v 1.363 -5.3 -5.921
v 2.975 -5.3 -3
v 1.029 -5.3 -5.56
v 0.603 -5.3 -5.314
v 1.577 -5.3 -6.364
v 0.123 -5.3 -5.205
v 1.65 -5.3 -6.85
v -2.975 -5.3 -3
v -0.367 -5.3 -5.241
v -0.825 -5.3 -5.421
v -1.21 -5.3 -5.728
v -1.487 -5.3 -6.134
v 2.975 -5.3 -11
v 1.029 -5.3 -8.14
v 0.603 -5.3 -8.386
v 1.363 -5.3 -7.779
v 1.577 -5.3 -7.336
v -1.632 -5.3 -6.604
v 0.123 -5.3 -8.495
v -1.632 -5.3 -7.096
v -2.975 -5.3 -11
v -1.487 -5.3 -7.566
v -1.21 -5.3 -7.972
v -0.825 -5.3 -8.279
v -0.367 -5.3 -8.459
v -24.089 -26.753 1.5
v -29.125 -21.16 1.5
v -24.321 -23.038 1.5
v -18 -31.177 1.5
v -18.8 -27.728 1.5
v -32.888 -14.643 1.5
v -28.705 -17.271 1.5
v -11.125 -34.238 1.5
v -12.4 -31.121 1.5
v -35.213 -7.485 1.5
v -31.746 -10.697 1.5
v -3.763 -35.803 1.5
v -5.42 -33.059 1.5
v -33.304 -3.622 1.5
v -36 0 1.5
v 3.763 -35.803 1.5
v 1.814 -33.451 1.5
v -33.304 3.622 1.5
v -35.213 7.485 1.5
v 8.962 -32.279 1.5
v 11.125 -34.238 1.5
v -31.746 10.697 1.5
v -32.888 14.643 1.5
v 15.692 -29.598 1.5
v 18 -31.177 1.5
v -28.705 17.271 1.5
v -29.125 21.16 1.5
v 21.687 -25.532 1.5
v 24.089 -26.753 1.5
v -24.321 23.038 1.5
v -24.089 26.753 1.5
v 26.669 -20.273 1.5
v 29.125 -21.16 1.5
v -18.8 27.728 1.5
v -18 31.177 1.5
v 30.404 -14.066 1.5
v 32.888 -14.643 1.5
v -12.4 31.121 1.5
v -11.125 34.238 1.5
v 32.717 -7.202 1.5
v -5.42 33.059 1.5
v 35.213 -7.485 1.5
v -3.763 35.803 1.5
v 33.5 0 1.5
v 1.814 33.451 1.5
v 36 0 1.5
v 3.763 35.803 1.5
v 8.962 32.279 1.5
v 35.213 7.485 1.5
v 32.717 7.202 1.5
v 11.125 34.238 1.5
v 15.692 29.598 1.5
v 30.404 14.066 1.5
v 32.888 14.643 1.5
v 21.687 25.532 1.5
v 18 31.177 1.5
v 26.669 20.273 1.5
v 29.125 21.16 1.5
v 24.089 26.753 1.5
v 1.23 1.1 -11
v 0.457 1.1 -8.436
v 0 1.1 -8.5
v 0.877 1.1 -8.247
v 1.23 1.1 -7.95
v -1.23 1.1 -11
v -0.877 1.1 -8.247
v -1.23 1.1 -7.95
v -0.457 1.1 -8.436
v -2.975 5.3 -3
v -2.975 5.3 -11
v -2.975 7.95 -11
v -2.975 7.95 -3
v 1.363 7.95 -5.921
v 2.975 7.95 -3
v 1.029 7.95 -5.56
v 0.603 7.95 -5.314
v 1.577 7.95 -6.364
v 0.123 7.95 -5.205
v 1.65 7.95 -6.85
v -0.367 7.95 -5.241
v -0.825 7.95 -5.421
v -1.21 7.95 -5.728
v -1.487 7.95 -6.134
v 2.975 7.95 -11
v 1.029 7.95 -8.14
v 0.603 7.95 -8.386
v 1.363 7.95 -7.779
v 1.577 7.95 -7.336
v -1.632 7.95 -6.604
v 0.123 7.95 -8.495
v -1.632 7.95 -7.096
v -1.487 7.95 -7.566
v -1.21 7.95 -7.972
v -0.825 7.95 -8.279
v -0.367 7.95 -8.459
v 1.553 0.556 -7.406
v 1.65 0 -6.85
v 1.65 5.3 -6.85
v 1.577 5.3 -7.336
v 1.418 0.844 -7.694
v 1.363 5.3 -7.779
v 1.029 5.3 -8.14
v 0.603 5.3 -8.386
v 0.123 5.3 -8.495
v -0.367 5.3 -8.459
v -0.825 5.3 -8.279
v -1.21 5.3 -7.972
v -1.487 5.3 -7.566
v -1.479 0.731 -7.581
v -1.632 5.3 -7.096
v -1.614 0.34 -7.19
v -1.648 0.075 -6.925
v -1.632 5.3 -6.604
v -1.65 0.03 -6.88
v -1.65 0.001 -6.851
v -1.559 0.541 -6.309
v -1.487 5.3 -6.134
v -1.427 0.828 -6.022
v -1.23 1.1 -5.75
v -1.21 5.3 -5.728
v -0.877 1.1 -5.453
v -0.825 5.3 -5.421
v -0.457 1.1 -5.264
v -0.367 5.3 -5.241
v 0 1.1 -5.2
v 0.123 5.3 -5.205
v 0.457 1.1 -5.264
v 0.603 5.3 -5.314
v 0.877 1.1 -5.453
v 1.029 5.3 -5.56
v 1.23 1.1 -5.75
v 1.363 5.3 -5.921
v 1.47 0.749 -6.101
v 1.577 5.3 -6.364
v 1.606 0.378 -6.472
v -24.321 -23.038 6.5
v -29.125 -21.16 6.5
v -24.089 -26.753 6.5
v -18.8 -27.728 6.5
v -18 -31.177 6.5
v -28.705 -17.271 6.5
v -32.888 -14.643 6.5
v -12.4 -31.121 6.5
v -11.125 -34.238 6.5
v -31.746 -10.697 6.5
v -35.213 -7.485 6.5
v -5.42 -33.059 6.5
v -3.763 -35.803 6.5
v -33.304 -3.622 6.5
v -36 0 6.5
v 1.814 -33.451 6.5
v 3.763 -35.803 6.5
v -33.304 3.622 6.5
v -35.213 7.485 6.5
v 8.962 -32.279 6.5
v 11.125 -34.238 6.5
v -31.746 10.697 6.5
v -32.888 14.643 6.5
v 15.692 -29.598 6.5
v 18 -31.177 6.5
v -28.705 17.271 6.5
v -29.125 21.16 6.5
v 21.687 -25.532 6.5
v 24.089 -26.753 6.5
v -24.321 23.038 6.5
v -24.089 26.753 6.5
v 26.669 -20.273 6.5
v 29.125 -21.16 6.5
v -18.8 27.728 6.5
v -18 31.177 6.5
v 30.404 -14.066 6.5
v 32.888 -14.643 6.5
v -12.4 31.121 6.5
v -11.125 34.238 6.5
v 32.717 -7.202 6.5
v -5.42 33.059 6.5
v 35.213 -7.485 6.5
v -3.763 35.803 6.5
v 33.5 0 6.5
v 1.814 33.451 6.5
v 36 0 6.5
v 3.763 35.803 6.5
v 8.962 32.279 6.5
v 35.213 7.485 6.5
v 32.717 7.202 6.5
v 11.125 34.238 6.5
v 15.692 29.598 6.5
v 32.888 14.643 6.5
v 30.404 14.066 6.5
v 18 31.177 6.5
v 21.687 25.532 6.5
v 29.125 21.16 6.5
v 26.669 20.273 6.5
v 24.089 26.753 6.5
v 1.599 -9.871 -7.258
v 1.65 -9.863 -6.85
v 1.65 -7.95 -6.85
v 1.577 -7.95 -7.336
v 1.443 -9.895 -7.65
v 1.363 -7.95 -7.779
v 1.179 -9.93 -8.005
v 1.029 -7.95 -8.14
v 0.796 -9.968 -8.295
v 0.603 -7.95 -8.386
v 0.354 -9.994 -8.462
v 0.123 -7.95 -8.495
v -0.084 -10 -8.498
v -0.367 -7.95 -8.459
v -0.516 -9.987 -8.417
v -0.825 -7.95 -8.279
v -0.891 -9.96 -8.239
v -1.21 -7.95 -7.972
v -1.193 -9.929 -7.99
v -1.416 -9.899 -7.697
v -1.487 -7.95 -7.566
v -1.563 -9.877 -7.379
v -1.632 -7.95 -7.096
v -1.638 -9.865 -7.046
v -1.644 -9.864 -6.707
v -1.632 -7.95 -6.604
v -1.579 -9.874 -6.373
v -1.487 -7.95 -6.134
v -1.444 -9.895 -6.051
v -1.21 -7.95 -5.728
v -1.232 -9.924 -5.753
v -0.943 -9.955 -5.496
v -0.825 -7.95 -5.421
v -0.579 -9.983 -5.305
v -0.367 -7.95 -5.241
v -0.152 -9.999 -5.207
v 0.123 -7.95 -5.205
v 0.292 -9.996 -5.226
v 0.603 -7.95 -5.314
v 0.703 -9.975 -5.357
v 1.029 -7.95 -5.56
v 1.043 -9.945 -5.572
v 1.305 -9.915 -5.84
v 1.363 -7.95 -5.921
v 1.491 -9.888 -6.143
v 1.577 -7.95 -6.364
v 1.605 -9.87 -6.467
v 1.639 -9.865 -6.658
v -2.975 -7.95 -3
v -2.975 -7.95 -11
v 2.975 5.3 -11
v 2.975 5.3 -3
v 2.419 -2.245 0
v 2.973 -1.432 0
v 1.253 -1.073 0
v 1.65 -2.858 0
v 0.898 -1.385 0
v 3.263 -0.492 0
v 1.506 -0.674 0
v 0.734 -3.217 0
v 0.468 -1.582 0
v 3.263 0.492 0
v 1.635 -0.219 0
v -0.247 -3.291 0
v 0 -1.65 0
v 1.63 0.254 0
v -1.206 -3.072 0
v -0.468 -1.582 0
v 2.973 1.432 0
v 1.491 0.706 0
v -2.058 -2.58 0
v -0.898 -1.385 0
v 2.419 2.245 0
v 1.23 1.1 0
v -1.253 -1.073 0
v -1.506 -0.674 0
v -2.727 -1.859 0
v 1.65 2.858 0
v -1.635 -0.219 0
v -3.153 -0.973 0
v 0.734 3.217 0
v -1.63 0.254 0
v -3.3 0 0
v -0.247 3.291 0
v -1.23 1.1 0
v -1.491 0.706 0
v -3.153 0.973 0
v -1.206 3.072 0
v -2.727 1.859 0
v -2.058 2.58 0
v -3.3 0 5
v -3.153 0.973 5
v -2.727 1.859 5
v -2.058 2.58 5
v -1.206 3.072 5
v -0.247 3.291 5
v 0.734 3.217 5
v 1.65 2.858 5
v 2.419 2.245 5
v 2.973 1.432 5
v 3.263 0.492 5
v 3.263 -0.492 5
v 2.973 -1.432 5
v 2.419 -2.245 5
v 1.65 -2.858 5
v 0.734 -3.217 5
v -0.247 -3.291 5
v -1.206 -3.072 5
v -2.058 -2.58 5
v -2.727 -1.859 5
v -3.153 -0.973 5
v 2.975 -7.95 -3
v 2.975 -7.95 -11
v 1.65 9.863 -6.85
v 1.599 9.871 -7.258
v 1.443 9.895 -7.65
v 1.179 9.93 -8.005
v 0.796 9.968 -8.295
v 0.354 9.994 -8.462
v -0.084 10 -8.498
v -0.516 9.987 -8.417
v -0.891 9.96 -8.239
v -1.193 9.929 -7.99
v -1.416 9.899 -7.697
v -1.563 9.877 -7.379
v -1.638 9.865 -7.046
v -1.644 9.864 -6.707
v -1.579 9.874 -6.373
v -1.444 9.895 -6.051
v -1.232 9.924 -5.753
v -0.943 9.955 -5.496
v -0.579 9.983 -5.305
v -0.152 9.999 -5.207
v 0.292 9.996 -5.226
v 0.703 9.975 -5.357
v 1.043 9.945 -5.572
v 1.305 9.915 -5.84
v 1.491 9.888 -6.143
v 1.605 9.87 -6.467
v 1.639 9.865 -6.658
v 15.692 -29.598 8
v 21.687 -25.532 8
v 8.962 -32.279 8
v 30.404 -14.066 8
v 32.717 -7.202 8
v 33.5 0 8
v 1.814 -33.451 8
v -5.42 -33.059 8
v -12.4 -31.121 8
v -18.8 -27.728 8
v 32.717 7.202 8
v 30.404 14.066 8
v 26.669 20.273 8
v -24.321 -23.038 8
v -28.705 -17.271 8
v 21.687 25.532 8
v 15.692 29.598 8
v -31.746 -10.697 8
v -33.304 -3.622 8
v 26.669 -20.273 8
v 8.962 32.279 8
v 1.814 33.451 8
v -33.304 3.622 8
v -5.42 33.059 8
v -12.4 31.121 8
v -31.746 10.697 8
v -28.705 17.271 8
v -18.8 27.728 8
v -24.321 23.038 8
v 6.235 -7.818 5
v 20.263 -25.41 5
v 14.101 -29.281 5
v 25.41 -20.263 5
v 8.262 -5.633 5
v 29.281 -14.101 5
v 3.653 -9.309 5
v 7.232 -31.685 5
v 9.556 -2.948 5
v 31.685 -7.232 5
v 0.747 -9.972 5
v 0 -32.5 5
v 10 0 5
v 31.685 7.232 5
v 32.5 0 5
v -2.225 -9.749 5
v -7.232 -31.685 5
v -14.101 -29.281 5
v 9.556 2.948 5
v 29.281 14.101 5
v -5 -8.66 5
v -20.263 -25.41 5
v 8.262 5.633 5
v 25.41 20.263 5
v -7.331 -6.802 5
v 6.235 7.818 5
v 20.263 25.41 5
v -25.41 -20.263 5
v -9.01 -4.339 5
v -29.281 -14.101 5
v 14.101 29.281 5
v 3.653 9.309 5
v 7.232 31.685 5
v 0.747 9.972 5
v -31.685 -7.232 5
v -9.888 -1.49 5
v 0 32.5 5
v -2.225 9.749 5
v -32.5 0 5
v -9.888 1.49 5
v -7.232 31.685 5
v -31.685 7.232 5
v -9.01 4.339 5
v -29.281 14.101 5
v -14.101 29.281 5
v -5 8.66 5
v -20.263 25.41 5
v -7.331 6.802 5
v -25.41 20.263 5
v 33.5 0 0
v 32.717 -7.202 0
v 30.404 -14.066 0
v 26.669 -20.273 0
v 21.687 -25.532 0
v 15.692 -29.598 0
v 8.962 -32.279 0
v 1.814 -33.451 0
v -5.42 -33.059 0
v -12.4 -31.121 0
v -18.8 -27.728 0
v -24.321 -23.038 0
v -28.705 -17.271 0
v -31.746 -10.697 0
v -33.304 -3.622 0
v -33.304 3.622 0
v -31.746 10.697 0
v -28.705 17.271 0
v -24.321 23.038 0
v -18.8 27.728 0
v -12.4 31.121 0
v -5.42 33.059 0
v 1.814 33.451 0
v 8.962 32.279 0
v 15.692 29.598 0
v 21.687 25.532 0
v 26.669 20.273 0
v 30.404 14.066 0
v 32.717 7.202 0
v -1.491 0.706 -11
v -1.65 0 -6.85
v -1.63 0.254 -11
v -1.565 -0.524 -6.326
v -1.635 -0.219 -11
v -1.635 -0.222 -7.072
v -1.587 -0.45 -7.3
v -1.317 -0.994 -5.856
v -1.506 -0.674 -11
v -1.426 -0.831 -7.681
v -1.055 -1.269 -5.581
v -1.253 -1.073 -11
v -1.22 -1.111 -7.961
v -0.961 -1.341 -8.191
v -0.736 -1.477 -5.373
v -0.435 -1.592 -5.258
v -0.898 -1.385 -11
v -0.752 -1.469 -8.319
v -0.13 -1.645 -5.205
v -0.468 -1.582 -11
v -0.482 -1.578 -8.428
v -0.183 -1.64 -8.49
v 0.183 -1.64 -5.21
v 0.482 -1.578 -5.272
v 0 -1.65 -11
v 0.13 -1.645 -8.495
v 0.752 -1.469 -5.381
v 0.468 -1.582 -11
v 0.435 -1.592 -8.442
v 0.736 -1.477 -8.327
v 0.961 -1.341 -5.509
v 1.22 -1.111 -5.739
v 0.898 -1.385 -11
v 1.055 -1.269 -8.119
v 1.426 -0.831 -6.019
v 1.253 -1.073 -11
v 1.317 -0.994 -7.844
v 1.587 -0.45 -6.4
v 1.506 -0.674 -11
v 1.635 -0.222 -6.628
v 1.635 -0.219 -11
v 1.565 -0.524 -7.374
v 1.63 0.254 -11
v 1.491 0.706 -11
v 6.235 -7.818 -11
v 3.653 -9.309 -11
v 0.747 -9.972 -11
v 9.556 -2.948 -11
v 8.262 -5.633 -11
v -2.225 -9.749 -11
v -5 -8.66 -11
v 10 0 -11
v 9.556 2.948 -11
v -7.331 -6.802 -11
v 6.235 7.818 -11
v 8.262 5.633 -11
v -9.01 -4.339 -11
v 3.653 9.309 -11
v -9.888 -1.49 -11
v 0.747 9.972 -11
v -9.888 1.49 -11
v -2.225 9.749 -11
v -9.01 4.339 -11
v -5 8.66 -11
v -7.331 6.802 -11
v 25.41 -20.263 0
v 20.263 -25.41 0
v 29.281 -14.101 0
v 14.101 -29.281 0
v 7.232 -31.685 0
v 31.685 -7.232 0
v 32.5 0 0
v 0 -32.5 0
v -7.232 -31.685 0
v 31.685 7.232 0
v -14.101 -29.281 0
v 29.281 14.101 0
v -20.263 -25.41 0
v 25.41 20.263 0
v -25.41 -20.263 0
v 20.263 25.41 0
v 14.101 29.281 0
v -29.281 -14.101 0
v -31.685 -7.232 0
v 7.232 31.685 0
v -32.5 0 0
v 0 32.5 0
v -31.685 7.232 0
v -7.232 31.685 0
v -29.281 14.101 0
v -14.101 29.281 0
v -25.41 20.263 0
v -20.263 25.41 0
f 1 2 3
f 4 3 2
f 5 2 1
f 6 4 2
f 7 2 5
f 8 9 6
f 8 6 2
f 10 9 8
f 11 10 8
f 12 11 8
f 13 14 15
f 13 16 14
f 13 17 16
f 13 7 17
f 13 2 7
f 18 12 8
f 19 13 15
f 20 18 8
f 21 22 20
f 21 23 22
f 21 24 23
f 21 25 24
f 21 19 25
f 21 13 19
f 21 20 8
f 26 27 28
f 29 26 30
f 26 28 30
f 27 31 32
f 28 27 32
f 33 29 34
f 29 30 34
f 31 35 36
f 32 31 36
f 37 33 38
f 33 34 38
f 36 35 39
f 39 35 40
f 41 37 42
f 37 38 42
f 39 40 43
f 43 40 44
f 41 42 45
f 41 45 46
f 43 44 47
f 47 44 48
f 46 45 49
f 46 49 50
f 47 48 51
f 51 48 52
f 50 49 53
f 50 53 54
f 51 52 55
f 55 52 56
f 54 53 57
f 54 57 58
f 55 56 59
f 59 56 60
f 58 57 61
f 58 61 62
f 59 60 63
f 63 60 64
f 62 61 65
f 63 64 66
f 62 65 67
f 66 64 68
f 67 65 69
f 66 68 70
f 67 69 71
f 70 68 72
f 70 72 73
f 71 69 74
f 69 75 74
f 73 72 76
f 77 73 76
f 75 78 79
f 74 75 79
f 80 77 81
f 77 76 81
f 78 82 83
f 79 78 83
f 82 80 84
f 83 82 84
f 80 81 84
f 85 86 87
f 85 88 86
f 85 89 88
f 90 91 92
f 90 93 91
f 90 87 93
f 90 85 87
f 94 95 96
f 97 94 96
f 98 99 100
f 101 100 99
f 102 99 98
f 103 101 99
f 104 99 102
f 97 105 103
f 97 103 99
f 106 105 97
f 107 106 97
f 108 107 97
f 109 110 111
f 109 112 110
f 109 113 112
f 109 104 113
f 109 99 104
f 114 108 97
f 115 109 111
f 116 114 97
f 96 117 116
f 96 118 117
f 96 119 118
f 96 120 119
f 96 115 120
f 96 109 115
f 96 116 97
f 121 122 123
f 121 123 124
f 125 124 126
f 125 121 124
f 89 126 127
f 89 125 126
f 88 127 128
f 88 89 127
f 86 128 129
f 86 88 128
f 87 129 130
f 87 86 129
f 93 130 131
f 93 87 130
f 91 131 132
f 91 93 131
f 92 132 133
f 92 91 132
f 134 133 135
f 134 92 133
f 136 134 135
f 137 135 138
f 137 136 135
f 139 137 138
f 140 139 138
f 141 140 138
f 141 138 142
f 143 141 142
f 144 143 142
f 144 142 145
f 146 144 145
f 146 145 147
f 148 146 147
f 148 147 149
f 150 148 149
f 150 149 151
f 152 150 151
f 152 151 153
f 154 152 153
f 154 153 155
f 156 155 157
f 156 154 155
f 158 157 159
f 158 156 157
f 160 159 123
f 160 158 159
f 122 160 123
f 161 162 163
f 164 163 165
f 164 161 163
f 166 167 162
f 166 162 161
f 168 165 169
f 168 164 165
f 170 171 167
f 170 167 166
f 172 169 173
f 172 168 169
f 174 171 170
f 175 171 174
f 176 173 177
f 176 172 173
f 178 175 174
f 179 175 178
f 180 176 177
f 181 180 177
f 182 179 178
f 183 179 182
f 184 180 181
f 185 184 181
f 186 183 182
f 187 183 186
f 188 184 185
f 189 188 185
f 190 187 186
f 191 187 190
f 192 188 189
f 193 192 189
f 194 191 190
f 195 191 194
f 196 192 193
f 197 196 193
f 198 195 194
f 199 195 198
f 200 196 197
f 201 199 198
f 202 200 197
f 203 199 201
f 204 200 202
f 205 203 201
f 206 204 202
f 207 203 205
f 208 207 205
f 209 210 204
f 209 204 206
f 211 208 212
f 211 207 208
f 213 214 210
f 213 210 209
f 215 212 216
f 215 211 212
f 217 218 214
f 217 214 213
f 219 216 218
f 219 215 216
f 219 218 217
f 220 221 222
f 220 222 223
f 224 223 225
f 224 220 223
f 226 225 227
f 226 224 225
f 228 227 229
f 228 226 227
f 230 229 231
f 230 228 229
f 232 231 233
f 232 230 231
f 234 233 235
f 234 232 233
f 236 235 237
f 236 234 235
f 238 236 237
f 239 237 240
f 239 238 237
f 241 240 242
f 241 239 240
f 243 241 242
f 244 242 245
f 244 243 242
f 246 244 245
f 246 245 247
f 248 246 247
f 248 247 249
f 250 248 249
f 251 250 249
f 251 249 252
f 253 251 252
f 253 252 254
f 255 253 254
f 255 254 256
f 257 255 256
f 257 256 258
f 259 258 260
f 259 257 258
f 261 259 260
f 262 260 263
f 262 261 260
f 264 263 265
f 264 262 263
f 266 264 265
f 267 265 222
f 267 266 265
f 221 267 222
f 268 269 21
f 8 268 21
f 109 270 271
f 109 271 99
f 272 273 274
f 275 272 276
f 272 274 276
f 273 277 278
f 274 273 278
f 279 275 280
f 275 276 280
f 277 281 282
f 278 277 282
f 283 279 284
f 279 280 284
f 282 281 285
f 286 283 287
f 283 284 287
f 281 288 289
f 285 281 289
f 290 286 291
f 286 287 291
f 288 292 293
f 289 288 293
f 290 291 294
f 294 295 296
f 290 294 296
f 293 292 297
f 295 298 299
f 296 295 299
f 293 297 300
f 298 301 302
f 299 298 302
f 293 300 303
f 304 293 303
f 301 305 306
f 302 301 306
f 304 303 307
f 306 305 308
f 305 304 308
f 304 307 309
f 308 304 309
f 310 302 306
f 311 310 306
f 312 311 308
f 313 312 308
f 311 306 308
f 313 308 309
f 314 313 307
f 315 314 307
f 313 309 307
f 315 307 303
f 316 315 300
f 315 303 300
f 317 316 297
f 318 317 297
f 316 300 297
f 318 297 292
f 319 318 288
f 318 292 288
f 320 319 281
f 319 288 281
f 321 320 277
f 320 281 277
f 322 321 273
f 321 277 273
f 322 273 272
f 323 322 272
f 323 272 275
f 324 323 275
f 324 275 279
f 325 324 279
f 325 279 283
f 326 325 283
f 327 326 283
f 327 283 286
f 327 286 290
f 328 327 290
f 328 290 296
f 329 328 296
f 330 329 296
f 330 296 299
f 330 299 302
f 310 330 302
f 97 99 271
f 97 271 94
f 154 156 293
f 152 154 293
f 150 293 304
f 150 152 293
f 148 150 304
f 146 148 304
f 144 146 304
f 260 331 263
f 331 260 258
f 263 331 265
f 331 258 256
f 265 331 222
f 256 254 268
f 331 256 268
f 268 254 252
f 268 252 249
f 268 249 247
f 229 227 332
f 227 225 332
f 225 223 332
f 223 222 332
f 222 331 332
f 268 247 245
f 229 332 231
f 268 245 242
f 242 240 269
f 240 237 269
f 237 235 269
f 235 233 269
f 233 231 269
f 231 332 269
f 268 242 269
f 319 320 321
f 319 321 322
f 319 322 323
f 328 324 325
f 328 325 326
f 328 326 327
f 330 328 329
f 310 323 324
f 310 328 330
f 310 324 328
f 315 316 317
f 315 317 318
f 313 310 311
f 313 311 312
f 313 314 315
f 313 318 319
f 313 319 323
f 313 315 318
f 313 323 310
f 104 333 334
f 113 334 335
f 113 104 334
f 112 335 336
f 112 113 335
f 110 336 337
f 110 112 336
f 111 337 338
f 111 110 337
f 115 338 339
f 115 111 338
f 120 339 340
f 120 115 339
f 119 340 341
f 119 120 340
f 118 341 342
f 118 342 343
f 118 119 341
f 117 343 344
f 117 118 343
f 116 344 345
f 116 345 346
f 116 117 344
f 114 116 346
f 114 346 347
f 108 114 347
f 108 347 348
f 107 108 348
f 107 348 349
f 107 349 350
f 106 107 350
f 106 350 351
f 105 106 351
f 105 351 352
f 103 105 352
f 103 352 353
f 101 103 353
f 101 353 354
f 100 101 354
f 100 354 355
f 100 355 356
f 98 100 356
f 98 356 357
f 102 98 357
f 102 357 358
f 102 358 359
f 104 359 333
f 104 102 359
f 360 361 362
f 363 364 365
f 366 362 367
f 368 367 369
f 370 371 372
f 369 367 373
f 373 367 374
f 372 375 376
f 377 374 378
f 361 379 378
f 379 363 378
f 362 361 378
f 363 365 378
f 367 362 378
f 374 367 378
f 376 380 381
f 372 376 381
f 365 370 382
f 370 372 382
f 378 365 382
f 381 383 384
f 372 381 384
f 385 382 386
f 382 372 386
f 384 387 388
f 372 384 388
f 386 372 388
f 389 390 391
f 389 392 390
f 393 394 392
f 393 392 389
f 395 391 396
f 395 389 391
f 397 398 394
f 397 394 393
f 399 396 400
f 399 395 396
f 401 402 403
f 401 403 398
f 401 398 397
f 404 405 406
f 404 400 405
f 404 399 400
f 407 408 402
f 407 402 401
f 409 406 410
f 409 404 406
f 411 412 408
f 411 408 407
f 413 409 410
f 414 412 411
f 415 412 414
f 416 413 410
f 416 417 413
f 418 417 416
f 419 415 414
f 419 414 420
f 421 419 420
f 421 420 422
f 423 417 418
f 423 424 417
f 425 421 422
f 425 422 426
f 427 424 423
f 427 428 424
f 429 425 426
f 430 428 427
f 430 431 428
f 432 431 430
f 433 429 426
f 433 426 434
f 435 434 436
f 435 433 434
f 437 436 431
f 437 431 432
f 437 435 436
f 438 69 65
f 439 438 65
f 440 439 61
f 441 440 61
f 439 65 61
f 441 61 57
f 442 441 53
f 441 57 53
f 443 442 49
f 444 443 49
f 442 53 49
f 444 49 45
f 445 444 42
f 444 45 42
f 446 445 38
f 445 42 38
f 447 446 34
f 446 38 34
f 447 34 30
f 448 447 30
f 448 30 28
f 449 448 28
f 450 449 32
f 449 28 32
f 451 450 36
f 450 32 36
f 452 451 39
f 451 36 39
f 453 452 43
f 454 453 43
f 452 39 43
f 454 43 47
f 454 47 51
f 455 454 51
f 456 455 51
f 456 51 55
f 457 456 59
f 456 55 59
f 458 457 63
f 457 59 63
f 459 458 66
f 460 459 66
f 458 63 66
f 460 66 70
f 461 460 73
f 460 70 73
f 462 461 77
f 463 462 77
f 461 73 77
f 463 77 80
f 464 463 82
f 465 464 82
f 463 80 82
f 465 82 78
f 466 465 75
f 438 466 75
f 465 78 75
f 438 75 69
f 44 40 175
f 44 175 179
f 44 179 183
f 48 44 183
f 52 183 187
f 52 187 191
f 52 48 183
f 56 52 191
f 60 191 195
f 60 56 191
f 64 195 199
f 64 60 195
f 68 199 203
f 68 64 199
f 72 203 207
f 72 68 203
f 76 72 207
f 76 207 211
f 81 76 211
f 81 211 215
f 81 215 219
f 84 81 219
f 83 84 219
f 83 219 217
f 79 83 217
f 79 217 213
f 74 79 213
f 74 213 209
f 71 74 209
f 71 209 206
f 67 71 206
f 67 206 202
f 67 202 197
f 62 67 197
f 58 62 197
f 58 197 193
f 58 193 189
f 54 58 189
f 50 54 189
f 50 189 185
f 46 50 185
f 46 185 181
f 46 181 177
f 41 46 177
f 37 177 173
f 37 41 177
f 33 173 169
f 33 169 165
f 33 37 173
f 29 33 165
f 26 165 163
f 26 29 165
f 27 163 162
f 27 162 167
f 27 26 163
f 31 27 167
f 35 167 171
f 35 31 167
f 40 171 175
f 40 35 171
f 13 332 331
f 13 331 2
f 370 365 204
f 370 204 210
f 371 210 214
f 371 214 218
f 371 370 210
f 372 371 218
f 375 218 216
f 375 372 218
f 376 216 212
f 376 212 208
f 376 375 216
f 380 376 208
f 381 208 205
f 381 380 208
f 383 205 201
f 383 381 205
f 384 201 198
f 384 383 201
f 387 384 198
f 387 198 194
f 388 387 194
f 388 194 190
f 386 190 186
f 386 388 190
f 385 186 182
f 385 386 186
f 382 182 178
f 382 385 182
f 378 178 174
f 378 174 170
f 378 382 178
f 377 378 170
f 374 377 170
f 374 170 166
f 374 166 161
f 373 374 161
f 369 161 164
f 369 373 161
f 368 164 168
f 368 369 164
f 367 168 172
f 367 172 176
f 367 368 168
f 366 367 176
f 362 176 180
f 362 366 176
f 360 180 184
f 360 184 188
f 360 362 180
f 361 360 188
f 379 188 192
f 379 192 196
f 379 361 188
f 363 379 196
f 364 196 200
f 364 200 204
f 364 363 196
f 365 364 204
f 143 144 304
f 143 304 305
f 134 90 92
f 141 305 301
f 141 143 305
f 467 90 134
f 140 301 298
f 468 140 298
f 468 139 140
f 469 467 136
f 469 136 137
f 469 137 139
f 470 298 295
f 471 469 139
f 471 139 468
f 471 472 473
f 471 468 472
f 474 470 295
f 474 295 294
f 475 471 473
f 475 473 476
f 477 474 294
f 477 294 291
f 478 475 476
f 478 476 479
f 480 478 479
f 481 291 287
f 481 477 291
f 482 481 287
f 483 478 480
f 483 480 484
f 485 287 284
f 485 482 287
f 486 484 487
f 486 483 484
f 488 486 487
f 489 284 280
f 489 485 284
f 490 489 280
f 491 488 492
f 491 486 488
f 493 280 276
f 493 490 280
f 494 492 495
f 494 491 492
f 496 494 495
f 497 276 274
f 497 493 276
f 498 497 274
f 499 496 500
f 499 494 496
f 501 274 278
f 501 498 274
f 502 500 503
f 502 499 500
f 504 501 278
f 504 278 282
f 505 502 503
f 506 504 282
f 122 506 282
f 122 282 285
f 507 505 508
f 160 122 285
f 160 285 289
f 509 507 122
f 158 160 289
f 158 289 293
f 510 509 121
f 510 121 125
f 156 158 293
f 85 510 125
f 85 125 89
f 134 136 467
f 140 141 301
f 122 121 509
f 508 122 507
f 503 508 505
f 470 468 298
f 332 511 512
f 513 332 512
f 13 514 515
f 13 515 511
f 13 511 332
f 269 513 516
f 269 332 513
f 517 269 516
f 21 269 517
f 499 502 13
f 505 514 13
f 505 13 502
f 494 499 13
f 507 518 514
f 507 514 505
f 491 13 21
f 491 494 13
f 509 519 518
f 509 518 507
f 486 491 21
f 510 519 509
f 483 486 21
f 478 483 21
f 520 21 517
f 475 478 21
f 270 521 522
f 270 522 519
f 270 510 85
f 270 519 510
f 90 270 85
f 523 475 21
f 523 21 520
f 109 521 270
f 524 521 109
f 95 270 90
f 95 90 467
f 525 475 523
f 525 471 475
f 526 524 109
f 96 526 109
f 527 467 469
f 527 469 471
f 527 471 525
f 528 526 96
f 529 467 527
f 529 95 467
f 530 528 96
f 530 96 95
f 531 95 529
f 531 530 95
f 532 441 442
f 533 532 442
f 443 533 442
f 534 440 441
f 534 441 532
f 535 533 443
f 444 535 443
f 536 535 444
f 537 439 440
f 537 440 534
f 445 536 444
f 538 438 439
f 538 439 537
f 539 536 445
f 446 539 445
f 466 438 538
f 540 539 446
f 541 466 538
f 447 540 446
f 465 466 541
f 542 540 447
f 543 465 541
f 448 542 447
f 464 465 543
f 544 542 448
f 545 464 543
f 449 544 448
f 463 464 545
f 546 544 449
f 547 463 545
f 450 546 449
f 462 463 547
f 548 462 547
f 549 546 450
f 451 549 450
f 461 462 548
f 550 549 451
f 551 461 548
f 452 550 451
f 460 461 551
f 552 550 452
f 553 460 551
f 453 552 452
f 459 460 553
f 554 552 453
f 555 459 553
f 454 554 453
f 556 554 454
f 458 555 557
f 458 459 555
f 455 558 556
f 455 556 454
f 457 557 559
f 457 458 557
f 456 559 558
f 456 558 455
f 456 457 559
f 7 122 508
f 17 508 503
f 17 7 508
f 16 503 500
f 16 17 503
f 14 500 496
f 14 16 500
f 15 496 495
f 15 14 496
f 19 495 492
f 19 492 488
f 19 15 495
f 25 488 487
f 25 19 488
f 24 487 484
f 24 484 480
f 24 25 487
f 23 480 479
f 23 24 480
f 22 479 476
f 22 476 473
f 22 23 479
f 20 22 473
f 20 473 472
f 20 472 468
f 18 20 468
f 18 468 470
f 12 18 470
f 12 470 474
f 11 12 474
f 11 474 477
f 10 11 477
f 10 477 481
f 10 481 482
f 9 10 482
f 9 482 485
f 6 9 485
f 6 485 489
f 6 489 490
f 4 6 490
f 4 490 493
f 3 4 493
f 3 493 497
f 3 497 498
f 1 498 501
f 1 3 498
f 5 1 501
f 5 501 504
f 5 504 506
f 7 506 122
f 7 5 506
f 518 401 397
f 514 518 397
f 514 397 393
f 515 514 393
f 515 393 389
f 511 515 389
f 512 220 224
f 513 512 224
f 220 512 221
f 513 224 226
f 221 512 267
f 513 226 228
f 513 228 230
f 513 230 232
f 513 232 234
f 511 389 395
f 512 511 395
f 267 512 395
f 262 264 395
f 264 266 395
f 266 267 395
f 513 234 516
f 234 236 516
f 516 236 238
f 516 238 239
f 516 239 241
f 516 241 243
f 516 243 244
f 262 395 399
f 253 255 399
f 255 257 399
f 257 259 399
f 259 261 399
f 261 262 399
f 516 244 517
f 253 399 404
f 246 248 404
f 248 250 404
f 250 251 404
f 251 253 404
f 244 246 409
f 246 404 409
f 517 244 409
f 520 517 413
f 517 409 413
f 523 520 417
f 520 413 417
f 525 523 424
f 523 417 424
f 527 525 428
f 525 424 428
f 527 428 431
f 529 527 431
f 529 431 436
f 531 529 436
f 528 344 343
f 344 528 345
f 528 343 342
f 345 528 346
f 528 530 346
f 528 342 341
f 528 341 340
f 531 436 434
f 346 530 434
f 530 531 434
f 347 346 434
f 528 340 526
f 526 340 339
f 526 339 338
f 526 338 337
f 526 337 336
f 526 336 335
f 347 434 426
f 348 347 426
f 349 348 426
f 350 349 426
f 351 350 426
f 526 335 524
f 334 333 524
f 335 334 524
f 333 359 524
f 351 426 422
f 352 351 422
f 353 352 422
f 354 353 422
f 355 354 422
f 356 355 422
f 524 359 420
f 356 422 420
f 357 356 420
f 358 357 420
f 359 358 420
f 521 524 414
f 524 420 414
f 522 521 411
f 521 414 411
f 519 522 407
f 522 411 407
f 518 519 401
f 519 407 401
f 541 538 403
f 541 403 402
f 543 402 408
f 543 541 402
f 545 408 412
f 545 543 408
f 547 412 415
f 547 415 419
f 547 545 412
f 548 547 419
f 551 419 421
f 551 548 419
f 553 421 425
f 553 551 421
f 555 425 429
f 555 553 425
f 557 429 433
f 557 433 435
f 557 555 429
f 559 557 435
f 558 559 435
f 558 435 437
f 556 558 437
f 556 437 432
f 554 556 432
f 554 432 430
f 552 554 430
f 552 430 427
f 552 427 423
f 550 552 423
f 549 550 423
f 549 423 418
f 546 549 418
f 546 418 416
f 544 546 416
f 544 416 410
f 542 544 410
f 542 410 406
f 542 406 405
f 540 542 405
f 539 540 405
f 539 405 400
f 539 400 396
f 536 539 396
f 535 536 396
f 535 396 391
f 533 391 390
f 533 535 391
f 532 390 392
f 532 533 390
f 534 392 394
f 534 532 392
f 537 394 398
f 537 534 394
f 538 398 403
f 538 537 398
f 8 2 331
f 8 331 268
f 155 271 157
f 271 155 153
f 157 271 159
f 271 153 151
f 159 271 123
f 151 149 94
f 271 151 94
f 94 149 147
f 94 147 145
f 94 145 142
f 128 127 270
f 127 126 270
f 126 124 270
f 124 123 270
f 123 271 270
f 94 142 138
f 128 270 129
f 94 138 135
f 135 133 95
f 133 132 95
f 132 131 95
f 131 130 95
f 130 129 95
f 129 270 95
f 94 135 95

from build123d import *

# Parameters (mm, degrees)
ESBO_O1_R                     = 35
ESBO_O1_R_2                   = 32.5
RESSALTO_EXTRUS_O1_DEPTH      = 8
RESSALTO_EXTRUS_O2_START      = -3
ESBO_O2_R                     = 32.5
RESSALTO_EXTRUS_O2_DEPTH      = 3
ESBO_O3_R                     = 2.5
CORTE_EXTRUS_O1_DEPTH         = 3
RESSALTO_EXTRUS_O3_DEPTH      = 5
RESSALTO_EXTRUS_O3_DEPTH_BACK = 3
ESBO_O4_R                     = 37
ESBO_O4_R_2                   = 35
ESBO_O5_W                     = 1.8
ESBO_O5_H                     = 3
ESBO_O6_R                     = 12.55
RESSALTO_EXTRUS_O4_DEPTH      = 5
CORTE_EXTRUS_O2_DEPTH         = 53.933921071
CORTE_EXTRUS_O2_DEPTH_BACK    = 53.933921071
ESBO_O7_R                     = 7.55
RESSALTO_EXTRUS_O5_START      = -8
ESBO_O8_R                     = 37
ESBO_O8_R_2                   = 32.5
RESSALTO_EXTRUS_O5_DEPTH      = 8
ESBO_O9_R                     = 37
ESBO_O9_R_2                   = 33.5
CORTE_EXTRUS_O8_DEPTH         = 1.5
CORTE_EXTRUS_O9_START         = -1.5
ESBO_O12_R                    = 37
ESBO_O12_R_2                  = 33.5
CORTE_EXTRUS_O9_DEPTH         = 1.5
CORTE_EXTRUS_O10_START        = -10
ESBO_O13_R                    = 37
ESBO_O13_R_2                  = 36
CORTE_EXTRUS_O10_DEPTH        = 10
ESBO_O14_R                    = 37
ESBO_O14_R_2                  = 36
RESSALTO_EXTRUS_O6_DEPTH      = 5
ESBO_O15_R                    = 12.55
CORTE_EXTRUS_O11_DEPTH        = 53.933921071
ESBO_O16_R                    = 12.55
RESSALTO_EXTRUS_O7_DEPTH      = 3
ESBO_O17_R                    = 10
RESSALTO_EXTRUS_O8_DEPTH      = 16
ESBO_O18_R                    = 3.3
CORTE_EXTRUS_O12_DEPTH        = 16
ESBO_O19_W                    = 5.95
ESBO_O19_H                    = 2.65
CORTE_EXTRUS_O13_DEPTH        = 8
ESBO_O23_R                    = 37
ESBO_O23_R_2                  = 36
CORTE_EXTRUS_O15_DEPTH        = 54.798234172
ESBO_O24_R                    = 3.3
RESSALTO_EXTRUS_O9_DEPTH      = 11
CORTE_EXTRUS_O14_DEPTH        = 56.88103435
CORTE_EXTRUS_O14_DEPTH_BACK   = 56.88103435
ESBO_O21_R                    = 1.65


with BuildPart() as part:
    # Esboço1 → Ressalto-extrusão1 (new body)
    with BuildSketch(Plane.XY):
        Circle(ESBO_O1_R)
        Circle(ESBO_O1_R_2, mode=Mode.SUBTRACT)
    extrude(amount=RESSALTO_EXTRUS_O1_DEPTH)

    # Esboço2 → Ressalto-extrusão2 (add)
    with BuildSketch(Plane.XY.offset(8).offset(RESSALTO_EXTRUS_O2_START)):
        Circle(ESBO_O2_R)
    extrude(amount=RESSALTO_EXTRUS_O2_DEPTH)

    # Esboço3 → Corte-extrusão1 (cut)
    with BuildSketch(Plane.XY.offset(8)):
        Circle(ESBO_O3_R)
    extrude(amount=-CORTE_EXTRUS_O1_DEPTH, mode=Mode.SUBTRACT)

    # Esboço4 → Ressalto-extrusão3 (add, two sides: drawn at the far end of the back side and taken through both)
    with BuildSketch(Plane(origin=(0, 0, 5), x_dir=(-1, 0, 0), z_dir=(0, 0, -1)).offset(-RESSALTO_EXTRUS_O3_DEPTH_BACK)):
        Circle(ESBO_O4_R)
        Circle(ESBO_O4_R_2, mode=Mode.SUBTRACT)
    extrude(amount=RESSALTO_EXTRUS_O3_DEPTH + RESSALTO_EXTRUS_O3_DEPTH_BACK)

    # Esboço5 → Corte-Revolução1 (revolve, cut)
    with BuildSketch(Plane(origin=(0, 0, 0), x_dir=(1, 0, 0), z_dir=(0, 1, 0))):
        with Locations((-36.1, -2.5)):
            Rectangle(ESBO_O5_W, ESBO_O5_H)
        with Locations((-36.1, -5.5)):
            Rectangle(ESBO_O5_W, ESBO_O5_H)
    revolve(axis=Axis((0, 0, 8), (0, 0, -1)), mode=Mode.SUBTRACT)

    # Esboço6 → Ressalto-extrusão4 (add)
    with BuildSketch(Plane(origin=(0, 0, 5), x_dir=(-1, 0, 0), z_dir=(0, 0, -1))):
        with Locations(Location((0, 0, 0), (0, 0, 180))):
            Circle(ESBO_O6_R)
    extrude(amount=RESSALTO_EXTRUS_O4_DEPTH)

    # Esboço7 → Corte-extrusão2 (cut, two sides: drawn at the far end of the back side and taken through both)
    with BuildSketch(Plane(origin=(0, 0, 0), x_dir=(-1, 0, 0), z_dir=(0, 0, -1)).offset(-CORTE_EXTRUS_O2_DEPTH_BACK)):
        Circle(ESBO_O7_R)
    extrude(amount=CORTE_EXTRUS_O2_DEPTH + CORTE_EXTRUS_O2_DEPTH_BACK, mode=Mode.SUBTRACT)

    # Esboço8 → Ressalto-extrusão5 (add)
    with BuildSketch(Plane.XY.offset(8).offset(RESSALTO_EXTRUS_O5_START)):
        with Locations(Location((0, 0, 0), (0, 0, 180))):
            Circle(ESBO_O8_R)
        Circle(ESBO_O8_R_2, mode=Mode.SUBTRACT)
    extrude(amount=RESSALTO_EXTRUS_O5_DEPTH)

    # Esboço9 → Corte-extrusão8 (cut)
    with BuildSketch(Plane.XY.offset(8)):
        with Locations(Location((0, 0, 0), (0, 0, 180))):
            Circle(ESBO_O9_R)
        Circle(ESBO_O9_R_2, mode=Mode.SUBTRACT)
    extrude(amount=-CORTE_EXTRUS_O8_DEPTH, mode=Mode.SUBTRACT)

    # Esboço12 → Corte-extrusão9 (cut)
    with BuildSketch(Plane(origin=(0, 0, 0), x_dir=(-1, 0, 0), z_dir=(0, 0, -1)).offset(CORTE_EXTRUS_O9_START)):
        Circle(ESBO_O12_R)
        with Locations(Location((0, 0, 0), (0, 0, 180))):
            Circle(ESBO_O12_R_2, mode=Mode.SUBTRACT)
    extrude(amount=CORTE_EXTRUS_O9_DEPTH, mode=Mode.SUBTRACT)

    # Esboço13 → Corte-extrusão10 (cut)
    with BuildSketch(Plane(origin=(0, 0, 1.5), x_dir=(-1, 0, 0), z_dir=(0, 0, -1)).offset(CORTE_EXTRUS_O10_START)):
        Circle(ESBO_O13_R)
        Circle(ESBO_O13_R_2, mode=Mode.SUBTRACT)
    extrude(amount=CORTE_EXTRUS_O10_DEPTH, mode=Mode.SUBTRACT)

    # Esboço14 → Ressalto-extrusão6 (add)
    with BuildSketch(Plane.XY.offset(6.5)):
        Circle(ESBO_O14_R)
        Circle(ESBO_O14_R_2, mode=Mode.SUBTRACT)
    extrude(amount=-RESSALTO_EXTRUS_O6_DEPTH)

    # Esboço15 → Corte-extrusão11 (cut, through all)
    with BuildSketch(Plane(origin=(0, 0, 0), x_dir=(-1, 0, 0), z_dir=(0, 0, -1))):
        Circle(ESBO_O15_R)
    extrude(amount=-CORTE_EXTRUS_O11_DEPTH, mode=Mode.SUBTRACT)

    # Esboço16 → Ressalto-extrusão7 (add, through all)
    with BuildSketch(Plane(origin=(0, 0, 5), x_dir=(-1, 0, 0), z_dir=(0, 0, -1))):
        Circle(ESBO_O16_R)
    extrude(amount=-RESSALTO_EXTRUS_O7_DEPTH)

    # Esboço17 → Ressalto-extrusão8 (add)
    with BuildSketch(Plane(origin=(0, 0, 5), x_dir=(-1, 0, 0), z_dir=(0, 0, -1))):
        with Locations(Location((0, 0, 0), (0, 0, 180))):
            Circle(ESBO_O17_R)
    extrude(amount=RESSALTO_EXTRUS_O8_DEPTH)

    # Esboço18 → Corte-extrusão12 (cut)
    with BuildSketch(Plane(origin=(0, 0, -11), x_dir=(-1, 0, 0), z_dir=(0, 0, -1))):
        Circle(ESBO_O18_R)
    extrude(amount=-CORTE_EXTRUS_O12_DEPTH, mode=Mode.SUBTRACT)

    # Esboço19 → Corte-extrusão13 (cut)
    with BuildSketch(Plane(origin=(0, 0, -11), x_dir=(-1, 0, 0), z_dir=(0, 0, -1))):
        with Locations((0, -6.625)):
            Rectangle(ESBO_O19_W, ESBO_O19_H)
        with Locations((0, 6.625)):
            Rectangle(ESBO_O19_W, ESBO_O19_H)
    extrude(amount=-CORTE_EXTRUS_O13_DEPTH, mode=Mode.SUBTRACT)

    # Esboço23 → Corte-extrusão15 (cut, through all)
    with BuildSketch(Plane(origin=(0, 0, 1.5), x_dir=(-1, 0, 0), z_dir=(0, 0, -1))):
        Circle(ESBO_O23_R)
        Circle(ESBO_O23_R_2, mode=Mode.SUBTRACT)
    extrude(amount=-CORTE_EXTRUS_O15_DEPTH, mode=Mode.SUBTRACT)

    # Esboço24 → Ressalto-extrusão9 (add)
    with BuildSketch(Plane(origin=(0, 0, -11), x_dir=(-1, 0, 0), z_dir=(0, 0, -1))):
        Circle(ESBO_O24_R)
        with BuildLine():
            Line((-1.229837388, 1.1), (1.229837388, 1.1))
            ThreePointArc((1.229837388, 1.1), (0, -1.65), (-1.229837388, 1.1))
        make_face(mode=Mode.SUBTRACT)
    extrude(amount=-RESSALTO_EXTRUS_O9_DEPTH)

    # Esboço21 → Corte-extrusão14 (cut, two sides: drawn at the far end of the back side and taken through both)
    with BuildSketch(Plane(origin=(0, 5.3, 0), x_dir=(1, 0, 0), z_dir=(0, 1, 0)).offset(-CORTE_EXTRUS_O14_DEPTH_BACK)):
        with Locations((0, 6.85)):
            Circle(ESBO_O21_R)
    extrude(amount=CORTE_EXTRUS_O14_DEPTH + CORTE_EXTRUS_O14_DEPTH_BACK, mode=Mode.SUBTRACT)


solid = part.part
